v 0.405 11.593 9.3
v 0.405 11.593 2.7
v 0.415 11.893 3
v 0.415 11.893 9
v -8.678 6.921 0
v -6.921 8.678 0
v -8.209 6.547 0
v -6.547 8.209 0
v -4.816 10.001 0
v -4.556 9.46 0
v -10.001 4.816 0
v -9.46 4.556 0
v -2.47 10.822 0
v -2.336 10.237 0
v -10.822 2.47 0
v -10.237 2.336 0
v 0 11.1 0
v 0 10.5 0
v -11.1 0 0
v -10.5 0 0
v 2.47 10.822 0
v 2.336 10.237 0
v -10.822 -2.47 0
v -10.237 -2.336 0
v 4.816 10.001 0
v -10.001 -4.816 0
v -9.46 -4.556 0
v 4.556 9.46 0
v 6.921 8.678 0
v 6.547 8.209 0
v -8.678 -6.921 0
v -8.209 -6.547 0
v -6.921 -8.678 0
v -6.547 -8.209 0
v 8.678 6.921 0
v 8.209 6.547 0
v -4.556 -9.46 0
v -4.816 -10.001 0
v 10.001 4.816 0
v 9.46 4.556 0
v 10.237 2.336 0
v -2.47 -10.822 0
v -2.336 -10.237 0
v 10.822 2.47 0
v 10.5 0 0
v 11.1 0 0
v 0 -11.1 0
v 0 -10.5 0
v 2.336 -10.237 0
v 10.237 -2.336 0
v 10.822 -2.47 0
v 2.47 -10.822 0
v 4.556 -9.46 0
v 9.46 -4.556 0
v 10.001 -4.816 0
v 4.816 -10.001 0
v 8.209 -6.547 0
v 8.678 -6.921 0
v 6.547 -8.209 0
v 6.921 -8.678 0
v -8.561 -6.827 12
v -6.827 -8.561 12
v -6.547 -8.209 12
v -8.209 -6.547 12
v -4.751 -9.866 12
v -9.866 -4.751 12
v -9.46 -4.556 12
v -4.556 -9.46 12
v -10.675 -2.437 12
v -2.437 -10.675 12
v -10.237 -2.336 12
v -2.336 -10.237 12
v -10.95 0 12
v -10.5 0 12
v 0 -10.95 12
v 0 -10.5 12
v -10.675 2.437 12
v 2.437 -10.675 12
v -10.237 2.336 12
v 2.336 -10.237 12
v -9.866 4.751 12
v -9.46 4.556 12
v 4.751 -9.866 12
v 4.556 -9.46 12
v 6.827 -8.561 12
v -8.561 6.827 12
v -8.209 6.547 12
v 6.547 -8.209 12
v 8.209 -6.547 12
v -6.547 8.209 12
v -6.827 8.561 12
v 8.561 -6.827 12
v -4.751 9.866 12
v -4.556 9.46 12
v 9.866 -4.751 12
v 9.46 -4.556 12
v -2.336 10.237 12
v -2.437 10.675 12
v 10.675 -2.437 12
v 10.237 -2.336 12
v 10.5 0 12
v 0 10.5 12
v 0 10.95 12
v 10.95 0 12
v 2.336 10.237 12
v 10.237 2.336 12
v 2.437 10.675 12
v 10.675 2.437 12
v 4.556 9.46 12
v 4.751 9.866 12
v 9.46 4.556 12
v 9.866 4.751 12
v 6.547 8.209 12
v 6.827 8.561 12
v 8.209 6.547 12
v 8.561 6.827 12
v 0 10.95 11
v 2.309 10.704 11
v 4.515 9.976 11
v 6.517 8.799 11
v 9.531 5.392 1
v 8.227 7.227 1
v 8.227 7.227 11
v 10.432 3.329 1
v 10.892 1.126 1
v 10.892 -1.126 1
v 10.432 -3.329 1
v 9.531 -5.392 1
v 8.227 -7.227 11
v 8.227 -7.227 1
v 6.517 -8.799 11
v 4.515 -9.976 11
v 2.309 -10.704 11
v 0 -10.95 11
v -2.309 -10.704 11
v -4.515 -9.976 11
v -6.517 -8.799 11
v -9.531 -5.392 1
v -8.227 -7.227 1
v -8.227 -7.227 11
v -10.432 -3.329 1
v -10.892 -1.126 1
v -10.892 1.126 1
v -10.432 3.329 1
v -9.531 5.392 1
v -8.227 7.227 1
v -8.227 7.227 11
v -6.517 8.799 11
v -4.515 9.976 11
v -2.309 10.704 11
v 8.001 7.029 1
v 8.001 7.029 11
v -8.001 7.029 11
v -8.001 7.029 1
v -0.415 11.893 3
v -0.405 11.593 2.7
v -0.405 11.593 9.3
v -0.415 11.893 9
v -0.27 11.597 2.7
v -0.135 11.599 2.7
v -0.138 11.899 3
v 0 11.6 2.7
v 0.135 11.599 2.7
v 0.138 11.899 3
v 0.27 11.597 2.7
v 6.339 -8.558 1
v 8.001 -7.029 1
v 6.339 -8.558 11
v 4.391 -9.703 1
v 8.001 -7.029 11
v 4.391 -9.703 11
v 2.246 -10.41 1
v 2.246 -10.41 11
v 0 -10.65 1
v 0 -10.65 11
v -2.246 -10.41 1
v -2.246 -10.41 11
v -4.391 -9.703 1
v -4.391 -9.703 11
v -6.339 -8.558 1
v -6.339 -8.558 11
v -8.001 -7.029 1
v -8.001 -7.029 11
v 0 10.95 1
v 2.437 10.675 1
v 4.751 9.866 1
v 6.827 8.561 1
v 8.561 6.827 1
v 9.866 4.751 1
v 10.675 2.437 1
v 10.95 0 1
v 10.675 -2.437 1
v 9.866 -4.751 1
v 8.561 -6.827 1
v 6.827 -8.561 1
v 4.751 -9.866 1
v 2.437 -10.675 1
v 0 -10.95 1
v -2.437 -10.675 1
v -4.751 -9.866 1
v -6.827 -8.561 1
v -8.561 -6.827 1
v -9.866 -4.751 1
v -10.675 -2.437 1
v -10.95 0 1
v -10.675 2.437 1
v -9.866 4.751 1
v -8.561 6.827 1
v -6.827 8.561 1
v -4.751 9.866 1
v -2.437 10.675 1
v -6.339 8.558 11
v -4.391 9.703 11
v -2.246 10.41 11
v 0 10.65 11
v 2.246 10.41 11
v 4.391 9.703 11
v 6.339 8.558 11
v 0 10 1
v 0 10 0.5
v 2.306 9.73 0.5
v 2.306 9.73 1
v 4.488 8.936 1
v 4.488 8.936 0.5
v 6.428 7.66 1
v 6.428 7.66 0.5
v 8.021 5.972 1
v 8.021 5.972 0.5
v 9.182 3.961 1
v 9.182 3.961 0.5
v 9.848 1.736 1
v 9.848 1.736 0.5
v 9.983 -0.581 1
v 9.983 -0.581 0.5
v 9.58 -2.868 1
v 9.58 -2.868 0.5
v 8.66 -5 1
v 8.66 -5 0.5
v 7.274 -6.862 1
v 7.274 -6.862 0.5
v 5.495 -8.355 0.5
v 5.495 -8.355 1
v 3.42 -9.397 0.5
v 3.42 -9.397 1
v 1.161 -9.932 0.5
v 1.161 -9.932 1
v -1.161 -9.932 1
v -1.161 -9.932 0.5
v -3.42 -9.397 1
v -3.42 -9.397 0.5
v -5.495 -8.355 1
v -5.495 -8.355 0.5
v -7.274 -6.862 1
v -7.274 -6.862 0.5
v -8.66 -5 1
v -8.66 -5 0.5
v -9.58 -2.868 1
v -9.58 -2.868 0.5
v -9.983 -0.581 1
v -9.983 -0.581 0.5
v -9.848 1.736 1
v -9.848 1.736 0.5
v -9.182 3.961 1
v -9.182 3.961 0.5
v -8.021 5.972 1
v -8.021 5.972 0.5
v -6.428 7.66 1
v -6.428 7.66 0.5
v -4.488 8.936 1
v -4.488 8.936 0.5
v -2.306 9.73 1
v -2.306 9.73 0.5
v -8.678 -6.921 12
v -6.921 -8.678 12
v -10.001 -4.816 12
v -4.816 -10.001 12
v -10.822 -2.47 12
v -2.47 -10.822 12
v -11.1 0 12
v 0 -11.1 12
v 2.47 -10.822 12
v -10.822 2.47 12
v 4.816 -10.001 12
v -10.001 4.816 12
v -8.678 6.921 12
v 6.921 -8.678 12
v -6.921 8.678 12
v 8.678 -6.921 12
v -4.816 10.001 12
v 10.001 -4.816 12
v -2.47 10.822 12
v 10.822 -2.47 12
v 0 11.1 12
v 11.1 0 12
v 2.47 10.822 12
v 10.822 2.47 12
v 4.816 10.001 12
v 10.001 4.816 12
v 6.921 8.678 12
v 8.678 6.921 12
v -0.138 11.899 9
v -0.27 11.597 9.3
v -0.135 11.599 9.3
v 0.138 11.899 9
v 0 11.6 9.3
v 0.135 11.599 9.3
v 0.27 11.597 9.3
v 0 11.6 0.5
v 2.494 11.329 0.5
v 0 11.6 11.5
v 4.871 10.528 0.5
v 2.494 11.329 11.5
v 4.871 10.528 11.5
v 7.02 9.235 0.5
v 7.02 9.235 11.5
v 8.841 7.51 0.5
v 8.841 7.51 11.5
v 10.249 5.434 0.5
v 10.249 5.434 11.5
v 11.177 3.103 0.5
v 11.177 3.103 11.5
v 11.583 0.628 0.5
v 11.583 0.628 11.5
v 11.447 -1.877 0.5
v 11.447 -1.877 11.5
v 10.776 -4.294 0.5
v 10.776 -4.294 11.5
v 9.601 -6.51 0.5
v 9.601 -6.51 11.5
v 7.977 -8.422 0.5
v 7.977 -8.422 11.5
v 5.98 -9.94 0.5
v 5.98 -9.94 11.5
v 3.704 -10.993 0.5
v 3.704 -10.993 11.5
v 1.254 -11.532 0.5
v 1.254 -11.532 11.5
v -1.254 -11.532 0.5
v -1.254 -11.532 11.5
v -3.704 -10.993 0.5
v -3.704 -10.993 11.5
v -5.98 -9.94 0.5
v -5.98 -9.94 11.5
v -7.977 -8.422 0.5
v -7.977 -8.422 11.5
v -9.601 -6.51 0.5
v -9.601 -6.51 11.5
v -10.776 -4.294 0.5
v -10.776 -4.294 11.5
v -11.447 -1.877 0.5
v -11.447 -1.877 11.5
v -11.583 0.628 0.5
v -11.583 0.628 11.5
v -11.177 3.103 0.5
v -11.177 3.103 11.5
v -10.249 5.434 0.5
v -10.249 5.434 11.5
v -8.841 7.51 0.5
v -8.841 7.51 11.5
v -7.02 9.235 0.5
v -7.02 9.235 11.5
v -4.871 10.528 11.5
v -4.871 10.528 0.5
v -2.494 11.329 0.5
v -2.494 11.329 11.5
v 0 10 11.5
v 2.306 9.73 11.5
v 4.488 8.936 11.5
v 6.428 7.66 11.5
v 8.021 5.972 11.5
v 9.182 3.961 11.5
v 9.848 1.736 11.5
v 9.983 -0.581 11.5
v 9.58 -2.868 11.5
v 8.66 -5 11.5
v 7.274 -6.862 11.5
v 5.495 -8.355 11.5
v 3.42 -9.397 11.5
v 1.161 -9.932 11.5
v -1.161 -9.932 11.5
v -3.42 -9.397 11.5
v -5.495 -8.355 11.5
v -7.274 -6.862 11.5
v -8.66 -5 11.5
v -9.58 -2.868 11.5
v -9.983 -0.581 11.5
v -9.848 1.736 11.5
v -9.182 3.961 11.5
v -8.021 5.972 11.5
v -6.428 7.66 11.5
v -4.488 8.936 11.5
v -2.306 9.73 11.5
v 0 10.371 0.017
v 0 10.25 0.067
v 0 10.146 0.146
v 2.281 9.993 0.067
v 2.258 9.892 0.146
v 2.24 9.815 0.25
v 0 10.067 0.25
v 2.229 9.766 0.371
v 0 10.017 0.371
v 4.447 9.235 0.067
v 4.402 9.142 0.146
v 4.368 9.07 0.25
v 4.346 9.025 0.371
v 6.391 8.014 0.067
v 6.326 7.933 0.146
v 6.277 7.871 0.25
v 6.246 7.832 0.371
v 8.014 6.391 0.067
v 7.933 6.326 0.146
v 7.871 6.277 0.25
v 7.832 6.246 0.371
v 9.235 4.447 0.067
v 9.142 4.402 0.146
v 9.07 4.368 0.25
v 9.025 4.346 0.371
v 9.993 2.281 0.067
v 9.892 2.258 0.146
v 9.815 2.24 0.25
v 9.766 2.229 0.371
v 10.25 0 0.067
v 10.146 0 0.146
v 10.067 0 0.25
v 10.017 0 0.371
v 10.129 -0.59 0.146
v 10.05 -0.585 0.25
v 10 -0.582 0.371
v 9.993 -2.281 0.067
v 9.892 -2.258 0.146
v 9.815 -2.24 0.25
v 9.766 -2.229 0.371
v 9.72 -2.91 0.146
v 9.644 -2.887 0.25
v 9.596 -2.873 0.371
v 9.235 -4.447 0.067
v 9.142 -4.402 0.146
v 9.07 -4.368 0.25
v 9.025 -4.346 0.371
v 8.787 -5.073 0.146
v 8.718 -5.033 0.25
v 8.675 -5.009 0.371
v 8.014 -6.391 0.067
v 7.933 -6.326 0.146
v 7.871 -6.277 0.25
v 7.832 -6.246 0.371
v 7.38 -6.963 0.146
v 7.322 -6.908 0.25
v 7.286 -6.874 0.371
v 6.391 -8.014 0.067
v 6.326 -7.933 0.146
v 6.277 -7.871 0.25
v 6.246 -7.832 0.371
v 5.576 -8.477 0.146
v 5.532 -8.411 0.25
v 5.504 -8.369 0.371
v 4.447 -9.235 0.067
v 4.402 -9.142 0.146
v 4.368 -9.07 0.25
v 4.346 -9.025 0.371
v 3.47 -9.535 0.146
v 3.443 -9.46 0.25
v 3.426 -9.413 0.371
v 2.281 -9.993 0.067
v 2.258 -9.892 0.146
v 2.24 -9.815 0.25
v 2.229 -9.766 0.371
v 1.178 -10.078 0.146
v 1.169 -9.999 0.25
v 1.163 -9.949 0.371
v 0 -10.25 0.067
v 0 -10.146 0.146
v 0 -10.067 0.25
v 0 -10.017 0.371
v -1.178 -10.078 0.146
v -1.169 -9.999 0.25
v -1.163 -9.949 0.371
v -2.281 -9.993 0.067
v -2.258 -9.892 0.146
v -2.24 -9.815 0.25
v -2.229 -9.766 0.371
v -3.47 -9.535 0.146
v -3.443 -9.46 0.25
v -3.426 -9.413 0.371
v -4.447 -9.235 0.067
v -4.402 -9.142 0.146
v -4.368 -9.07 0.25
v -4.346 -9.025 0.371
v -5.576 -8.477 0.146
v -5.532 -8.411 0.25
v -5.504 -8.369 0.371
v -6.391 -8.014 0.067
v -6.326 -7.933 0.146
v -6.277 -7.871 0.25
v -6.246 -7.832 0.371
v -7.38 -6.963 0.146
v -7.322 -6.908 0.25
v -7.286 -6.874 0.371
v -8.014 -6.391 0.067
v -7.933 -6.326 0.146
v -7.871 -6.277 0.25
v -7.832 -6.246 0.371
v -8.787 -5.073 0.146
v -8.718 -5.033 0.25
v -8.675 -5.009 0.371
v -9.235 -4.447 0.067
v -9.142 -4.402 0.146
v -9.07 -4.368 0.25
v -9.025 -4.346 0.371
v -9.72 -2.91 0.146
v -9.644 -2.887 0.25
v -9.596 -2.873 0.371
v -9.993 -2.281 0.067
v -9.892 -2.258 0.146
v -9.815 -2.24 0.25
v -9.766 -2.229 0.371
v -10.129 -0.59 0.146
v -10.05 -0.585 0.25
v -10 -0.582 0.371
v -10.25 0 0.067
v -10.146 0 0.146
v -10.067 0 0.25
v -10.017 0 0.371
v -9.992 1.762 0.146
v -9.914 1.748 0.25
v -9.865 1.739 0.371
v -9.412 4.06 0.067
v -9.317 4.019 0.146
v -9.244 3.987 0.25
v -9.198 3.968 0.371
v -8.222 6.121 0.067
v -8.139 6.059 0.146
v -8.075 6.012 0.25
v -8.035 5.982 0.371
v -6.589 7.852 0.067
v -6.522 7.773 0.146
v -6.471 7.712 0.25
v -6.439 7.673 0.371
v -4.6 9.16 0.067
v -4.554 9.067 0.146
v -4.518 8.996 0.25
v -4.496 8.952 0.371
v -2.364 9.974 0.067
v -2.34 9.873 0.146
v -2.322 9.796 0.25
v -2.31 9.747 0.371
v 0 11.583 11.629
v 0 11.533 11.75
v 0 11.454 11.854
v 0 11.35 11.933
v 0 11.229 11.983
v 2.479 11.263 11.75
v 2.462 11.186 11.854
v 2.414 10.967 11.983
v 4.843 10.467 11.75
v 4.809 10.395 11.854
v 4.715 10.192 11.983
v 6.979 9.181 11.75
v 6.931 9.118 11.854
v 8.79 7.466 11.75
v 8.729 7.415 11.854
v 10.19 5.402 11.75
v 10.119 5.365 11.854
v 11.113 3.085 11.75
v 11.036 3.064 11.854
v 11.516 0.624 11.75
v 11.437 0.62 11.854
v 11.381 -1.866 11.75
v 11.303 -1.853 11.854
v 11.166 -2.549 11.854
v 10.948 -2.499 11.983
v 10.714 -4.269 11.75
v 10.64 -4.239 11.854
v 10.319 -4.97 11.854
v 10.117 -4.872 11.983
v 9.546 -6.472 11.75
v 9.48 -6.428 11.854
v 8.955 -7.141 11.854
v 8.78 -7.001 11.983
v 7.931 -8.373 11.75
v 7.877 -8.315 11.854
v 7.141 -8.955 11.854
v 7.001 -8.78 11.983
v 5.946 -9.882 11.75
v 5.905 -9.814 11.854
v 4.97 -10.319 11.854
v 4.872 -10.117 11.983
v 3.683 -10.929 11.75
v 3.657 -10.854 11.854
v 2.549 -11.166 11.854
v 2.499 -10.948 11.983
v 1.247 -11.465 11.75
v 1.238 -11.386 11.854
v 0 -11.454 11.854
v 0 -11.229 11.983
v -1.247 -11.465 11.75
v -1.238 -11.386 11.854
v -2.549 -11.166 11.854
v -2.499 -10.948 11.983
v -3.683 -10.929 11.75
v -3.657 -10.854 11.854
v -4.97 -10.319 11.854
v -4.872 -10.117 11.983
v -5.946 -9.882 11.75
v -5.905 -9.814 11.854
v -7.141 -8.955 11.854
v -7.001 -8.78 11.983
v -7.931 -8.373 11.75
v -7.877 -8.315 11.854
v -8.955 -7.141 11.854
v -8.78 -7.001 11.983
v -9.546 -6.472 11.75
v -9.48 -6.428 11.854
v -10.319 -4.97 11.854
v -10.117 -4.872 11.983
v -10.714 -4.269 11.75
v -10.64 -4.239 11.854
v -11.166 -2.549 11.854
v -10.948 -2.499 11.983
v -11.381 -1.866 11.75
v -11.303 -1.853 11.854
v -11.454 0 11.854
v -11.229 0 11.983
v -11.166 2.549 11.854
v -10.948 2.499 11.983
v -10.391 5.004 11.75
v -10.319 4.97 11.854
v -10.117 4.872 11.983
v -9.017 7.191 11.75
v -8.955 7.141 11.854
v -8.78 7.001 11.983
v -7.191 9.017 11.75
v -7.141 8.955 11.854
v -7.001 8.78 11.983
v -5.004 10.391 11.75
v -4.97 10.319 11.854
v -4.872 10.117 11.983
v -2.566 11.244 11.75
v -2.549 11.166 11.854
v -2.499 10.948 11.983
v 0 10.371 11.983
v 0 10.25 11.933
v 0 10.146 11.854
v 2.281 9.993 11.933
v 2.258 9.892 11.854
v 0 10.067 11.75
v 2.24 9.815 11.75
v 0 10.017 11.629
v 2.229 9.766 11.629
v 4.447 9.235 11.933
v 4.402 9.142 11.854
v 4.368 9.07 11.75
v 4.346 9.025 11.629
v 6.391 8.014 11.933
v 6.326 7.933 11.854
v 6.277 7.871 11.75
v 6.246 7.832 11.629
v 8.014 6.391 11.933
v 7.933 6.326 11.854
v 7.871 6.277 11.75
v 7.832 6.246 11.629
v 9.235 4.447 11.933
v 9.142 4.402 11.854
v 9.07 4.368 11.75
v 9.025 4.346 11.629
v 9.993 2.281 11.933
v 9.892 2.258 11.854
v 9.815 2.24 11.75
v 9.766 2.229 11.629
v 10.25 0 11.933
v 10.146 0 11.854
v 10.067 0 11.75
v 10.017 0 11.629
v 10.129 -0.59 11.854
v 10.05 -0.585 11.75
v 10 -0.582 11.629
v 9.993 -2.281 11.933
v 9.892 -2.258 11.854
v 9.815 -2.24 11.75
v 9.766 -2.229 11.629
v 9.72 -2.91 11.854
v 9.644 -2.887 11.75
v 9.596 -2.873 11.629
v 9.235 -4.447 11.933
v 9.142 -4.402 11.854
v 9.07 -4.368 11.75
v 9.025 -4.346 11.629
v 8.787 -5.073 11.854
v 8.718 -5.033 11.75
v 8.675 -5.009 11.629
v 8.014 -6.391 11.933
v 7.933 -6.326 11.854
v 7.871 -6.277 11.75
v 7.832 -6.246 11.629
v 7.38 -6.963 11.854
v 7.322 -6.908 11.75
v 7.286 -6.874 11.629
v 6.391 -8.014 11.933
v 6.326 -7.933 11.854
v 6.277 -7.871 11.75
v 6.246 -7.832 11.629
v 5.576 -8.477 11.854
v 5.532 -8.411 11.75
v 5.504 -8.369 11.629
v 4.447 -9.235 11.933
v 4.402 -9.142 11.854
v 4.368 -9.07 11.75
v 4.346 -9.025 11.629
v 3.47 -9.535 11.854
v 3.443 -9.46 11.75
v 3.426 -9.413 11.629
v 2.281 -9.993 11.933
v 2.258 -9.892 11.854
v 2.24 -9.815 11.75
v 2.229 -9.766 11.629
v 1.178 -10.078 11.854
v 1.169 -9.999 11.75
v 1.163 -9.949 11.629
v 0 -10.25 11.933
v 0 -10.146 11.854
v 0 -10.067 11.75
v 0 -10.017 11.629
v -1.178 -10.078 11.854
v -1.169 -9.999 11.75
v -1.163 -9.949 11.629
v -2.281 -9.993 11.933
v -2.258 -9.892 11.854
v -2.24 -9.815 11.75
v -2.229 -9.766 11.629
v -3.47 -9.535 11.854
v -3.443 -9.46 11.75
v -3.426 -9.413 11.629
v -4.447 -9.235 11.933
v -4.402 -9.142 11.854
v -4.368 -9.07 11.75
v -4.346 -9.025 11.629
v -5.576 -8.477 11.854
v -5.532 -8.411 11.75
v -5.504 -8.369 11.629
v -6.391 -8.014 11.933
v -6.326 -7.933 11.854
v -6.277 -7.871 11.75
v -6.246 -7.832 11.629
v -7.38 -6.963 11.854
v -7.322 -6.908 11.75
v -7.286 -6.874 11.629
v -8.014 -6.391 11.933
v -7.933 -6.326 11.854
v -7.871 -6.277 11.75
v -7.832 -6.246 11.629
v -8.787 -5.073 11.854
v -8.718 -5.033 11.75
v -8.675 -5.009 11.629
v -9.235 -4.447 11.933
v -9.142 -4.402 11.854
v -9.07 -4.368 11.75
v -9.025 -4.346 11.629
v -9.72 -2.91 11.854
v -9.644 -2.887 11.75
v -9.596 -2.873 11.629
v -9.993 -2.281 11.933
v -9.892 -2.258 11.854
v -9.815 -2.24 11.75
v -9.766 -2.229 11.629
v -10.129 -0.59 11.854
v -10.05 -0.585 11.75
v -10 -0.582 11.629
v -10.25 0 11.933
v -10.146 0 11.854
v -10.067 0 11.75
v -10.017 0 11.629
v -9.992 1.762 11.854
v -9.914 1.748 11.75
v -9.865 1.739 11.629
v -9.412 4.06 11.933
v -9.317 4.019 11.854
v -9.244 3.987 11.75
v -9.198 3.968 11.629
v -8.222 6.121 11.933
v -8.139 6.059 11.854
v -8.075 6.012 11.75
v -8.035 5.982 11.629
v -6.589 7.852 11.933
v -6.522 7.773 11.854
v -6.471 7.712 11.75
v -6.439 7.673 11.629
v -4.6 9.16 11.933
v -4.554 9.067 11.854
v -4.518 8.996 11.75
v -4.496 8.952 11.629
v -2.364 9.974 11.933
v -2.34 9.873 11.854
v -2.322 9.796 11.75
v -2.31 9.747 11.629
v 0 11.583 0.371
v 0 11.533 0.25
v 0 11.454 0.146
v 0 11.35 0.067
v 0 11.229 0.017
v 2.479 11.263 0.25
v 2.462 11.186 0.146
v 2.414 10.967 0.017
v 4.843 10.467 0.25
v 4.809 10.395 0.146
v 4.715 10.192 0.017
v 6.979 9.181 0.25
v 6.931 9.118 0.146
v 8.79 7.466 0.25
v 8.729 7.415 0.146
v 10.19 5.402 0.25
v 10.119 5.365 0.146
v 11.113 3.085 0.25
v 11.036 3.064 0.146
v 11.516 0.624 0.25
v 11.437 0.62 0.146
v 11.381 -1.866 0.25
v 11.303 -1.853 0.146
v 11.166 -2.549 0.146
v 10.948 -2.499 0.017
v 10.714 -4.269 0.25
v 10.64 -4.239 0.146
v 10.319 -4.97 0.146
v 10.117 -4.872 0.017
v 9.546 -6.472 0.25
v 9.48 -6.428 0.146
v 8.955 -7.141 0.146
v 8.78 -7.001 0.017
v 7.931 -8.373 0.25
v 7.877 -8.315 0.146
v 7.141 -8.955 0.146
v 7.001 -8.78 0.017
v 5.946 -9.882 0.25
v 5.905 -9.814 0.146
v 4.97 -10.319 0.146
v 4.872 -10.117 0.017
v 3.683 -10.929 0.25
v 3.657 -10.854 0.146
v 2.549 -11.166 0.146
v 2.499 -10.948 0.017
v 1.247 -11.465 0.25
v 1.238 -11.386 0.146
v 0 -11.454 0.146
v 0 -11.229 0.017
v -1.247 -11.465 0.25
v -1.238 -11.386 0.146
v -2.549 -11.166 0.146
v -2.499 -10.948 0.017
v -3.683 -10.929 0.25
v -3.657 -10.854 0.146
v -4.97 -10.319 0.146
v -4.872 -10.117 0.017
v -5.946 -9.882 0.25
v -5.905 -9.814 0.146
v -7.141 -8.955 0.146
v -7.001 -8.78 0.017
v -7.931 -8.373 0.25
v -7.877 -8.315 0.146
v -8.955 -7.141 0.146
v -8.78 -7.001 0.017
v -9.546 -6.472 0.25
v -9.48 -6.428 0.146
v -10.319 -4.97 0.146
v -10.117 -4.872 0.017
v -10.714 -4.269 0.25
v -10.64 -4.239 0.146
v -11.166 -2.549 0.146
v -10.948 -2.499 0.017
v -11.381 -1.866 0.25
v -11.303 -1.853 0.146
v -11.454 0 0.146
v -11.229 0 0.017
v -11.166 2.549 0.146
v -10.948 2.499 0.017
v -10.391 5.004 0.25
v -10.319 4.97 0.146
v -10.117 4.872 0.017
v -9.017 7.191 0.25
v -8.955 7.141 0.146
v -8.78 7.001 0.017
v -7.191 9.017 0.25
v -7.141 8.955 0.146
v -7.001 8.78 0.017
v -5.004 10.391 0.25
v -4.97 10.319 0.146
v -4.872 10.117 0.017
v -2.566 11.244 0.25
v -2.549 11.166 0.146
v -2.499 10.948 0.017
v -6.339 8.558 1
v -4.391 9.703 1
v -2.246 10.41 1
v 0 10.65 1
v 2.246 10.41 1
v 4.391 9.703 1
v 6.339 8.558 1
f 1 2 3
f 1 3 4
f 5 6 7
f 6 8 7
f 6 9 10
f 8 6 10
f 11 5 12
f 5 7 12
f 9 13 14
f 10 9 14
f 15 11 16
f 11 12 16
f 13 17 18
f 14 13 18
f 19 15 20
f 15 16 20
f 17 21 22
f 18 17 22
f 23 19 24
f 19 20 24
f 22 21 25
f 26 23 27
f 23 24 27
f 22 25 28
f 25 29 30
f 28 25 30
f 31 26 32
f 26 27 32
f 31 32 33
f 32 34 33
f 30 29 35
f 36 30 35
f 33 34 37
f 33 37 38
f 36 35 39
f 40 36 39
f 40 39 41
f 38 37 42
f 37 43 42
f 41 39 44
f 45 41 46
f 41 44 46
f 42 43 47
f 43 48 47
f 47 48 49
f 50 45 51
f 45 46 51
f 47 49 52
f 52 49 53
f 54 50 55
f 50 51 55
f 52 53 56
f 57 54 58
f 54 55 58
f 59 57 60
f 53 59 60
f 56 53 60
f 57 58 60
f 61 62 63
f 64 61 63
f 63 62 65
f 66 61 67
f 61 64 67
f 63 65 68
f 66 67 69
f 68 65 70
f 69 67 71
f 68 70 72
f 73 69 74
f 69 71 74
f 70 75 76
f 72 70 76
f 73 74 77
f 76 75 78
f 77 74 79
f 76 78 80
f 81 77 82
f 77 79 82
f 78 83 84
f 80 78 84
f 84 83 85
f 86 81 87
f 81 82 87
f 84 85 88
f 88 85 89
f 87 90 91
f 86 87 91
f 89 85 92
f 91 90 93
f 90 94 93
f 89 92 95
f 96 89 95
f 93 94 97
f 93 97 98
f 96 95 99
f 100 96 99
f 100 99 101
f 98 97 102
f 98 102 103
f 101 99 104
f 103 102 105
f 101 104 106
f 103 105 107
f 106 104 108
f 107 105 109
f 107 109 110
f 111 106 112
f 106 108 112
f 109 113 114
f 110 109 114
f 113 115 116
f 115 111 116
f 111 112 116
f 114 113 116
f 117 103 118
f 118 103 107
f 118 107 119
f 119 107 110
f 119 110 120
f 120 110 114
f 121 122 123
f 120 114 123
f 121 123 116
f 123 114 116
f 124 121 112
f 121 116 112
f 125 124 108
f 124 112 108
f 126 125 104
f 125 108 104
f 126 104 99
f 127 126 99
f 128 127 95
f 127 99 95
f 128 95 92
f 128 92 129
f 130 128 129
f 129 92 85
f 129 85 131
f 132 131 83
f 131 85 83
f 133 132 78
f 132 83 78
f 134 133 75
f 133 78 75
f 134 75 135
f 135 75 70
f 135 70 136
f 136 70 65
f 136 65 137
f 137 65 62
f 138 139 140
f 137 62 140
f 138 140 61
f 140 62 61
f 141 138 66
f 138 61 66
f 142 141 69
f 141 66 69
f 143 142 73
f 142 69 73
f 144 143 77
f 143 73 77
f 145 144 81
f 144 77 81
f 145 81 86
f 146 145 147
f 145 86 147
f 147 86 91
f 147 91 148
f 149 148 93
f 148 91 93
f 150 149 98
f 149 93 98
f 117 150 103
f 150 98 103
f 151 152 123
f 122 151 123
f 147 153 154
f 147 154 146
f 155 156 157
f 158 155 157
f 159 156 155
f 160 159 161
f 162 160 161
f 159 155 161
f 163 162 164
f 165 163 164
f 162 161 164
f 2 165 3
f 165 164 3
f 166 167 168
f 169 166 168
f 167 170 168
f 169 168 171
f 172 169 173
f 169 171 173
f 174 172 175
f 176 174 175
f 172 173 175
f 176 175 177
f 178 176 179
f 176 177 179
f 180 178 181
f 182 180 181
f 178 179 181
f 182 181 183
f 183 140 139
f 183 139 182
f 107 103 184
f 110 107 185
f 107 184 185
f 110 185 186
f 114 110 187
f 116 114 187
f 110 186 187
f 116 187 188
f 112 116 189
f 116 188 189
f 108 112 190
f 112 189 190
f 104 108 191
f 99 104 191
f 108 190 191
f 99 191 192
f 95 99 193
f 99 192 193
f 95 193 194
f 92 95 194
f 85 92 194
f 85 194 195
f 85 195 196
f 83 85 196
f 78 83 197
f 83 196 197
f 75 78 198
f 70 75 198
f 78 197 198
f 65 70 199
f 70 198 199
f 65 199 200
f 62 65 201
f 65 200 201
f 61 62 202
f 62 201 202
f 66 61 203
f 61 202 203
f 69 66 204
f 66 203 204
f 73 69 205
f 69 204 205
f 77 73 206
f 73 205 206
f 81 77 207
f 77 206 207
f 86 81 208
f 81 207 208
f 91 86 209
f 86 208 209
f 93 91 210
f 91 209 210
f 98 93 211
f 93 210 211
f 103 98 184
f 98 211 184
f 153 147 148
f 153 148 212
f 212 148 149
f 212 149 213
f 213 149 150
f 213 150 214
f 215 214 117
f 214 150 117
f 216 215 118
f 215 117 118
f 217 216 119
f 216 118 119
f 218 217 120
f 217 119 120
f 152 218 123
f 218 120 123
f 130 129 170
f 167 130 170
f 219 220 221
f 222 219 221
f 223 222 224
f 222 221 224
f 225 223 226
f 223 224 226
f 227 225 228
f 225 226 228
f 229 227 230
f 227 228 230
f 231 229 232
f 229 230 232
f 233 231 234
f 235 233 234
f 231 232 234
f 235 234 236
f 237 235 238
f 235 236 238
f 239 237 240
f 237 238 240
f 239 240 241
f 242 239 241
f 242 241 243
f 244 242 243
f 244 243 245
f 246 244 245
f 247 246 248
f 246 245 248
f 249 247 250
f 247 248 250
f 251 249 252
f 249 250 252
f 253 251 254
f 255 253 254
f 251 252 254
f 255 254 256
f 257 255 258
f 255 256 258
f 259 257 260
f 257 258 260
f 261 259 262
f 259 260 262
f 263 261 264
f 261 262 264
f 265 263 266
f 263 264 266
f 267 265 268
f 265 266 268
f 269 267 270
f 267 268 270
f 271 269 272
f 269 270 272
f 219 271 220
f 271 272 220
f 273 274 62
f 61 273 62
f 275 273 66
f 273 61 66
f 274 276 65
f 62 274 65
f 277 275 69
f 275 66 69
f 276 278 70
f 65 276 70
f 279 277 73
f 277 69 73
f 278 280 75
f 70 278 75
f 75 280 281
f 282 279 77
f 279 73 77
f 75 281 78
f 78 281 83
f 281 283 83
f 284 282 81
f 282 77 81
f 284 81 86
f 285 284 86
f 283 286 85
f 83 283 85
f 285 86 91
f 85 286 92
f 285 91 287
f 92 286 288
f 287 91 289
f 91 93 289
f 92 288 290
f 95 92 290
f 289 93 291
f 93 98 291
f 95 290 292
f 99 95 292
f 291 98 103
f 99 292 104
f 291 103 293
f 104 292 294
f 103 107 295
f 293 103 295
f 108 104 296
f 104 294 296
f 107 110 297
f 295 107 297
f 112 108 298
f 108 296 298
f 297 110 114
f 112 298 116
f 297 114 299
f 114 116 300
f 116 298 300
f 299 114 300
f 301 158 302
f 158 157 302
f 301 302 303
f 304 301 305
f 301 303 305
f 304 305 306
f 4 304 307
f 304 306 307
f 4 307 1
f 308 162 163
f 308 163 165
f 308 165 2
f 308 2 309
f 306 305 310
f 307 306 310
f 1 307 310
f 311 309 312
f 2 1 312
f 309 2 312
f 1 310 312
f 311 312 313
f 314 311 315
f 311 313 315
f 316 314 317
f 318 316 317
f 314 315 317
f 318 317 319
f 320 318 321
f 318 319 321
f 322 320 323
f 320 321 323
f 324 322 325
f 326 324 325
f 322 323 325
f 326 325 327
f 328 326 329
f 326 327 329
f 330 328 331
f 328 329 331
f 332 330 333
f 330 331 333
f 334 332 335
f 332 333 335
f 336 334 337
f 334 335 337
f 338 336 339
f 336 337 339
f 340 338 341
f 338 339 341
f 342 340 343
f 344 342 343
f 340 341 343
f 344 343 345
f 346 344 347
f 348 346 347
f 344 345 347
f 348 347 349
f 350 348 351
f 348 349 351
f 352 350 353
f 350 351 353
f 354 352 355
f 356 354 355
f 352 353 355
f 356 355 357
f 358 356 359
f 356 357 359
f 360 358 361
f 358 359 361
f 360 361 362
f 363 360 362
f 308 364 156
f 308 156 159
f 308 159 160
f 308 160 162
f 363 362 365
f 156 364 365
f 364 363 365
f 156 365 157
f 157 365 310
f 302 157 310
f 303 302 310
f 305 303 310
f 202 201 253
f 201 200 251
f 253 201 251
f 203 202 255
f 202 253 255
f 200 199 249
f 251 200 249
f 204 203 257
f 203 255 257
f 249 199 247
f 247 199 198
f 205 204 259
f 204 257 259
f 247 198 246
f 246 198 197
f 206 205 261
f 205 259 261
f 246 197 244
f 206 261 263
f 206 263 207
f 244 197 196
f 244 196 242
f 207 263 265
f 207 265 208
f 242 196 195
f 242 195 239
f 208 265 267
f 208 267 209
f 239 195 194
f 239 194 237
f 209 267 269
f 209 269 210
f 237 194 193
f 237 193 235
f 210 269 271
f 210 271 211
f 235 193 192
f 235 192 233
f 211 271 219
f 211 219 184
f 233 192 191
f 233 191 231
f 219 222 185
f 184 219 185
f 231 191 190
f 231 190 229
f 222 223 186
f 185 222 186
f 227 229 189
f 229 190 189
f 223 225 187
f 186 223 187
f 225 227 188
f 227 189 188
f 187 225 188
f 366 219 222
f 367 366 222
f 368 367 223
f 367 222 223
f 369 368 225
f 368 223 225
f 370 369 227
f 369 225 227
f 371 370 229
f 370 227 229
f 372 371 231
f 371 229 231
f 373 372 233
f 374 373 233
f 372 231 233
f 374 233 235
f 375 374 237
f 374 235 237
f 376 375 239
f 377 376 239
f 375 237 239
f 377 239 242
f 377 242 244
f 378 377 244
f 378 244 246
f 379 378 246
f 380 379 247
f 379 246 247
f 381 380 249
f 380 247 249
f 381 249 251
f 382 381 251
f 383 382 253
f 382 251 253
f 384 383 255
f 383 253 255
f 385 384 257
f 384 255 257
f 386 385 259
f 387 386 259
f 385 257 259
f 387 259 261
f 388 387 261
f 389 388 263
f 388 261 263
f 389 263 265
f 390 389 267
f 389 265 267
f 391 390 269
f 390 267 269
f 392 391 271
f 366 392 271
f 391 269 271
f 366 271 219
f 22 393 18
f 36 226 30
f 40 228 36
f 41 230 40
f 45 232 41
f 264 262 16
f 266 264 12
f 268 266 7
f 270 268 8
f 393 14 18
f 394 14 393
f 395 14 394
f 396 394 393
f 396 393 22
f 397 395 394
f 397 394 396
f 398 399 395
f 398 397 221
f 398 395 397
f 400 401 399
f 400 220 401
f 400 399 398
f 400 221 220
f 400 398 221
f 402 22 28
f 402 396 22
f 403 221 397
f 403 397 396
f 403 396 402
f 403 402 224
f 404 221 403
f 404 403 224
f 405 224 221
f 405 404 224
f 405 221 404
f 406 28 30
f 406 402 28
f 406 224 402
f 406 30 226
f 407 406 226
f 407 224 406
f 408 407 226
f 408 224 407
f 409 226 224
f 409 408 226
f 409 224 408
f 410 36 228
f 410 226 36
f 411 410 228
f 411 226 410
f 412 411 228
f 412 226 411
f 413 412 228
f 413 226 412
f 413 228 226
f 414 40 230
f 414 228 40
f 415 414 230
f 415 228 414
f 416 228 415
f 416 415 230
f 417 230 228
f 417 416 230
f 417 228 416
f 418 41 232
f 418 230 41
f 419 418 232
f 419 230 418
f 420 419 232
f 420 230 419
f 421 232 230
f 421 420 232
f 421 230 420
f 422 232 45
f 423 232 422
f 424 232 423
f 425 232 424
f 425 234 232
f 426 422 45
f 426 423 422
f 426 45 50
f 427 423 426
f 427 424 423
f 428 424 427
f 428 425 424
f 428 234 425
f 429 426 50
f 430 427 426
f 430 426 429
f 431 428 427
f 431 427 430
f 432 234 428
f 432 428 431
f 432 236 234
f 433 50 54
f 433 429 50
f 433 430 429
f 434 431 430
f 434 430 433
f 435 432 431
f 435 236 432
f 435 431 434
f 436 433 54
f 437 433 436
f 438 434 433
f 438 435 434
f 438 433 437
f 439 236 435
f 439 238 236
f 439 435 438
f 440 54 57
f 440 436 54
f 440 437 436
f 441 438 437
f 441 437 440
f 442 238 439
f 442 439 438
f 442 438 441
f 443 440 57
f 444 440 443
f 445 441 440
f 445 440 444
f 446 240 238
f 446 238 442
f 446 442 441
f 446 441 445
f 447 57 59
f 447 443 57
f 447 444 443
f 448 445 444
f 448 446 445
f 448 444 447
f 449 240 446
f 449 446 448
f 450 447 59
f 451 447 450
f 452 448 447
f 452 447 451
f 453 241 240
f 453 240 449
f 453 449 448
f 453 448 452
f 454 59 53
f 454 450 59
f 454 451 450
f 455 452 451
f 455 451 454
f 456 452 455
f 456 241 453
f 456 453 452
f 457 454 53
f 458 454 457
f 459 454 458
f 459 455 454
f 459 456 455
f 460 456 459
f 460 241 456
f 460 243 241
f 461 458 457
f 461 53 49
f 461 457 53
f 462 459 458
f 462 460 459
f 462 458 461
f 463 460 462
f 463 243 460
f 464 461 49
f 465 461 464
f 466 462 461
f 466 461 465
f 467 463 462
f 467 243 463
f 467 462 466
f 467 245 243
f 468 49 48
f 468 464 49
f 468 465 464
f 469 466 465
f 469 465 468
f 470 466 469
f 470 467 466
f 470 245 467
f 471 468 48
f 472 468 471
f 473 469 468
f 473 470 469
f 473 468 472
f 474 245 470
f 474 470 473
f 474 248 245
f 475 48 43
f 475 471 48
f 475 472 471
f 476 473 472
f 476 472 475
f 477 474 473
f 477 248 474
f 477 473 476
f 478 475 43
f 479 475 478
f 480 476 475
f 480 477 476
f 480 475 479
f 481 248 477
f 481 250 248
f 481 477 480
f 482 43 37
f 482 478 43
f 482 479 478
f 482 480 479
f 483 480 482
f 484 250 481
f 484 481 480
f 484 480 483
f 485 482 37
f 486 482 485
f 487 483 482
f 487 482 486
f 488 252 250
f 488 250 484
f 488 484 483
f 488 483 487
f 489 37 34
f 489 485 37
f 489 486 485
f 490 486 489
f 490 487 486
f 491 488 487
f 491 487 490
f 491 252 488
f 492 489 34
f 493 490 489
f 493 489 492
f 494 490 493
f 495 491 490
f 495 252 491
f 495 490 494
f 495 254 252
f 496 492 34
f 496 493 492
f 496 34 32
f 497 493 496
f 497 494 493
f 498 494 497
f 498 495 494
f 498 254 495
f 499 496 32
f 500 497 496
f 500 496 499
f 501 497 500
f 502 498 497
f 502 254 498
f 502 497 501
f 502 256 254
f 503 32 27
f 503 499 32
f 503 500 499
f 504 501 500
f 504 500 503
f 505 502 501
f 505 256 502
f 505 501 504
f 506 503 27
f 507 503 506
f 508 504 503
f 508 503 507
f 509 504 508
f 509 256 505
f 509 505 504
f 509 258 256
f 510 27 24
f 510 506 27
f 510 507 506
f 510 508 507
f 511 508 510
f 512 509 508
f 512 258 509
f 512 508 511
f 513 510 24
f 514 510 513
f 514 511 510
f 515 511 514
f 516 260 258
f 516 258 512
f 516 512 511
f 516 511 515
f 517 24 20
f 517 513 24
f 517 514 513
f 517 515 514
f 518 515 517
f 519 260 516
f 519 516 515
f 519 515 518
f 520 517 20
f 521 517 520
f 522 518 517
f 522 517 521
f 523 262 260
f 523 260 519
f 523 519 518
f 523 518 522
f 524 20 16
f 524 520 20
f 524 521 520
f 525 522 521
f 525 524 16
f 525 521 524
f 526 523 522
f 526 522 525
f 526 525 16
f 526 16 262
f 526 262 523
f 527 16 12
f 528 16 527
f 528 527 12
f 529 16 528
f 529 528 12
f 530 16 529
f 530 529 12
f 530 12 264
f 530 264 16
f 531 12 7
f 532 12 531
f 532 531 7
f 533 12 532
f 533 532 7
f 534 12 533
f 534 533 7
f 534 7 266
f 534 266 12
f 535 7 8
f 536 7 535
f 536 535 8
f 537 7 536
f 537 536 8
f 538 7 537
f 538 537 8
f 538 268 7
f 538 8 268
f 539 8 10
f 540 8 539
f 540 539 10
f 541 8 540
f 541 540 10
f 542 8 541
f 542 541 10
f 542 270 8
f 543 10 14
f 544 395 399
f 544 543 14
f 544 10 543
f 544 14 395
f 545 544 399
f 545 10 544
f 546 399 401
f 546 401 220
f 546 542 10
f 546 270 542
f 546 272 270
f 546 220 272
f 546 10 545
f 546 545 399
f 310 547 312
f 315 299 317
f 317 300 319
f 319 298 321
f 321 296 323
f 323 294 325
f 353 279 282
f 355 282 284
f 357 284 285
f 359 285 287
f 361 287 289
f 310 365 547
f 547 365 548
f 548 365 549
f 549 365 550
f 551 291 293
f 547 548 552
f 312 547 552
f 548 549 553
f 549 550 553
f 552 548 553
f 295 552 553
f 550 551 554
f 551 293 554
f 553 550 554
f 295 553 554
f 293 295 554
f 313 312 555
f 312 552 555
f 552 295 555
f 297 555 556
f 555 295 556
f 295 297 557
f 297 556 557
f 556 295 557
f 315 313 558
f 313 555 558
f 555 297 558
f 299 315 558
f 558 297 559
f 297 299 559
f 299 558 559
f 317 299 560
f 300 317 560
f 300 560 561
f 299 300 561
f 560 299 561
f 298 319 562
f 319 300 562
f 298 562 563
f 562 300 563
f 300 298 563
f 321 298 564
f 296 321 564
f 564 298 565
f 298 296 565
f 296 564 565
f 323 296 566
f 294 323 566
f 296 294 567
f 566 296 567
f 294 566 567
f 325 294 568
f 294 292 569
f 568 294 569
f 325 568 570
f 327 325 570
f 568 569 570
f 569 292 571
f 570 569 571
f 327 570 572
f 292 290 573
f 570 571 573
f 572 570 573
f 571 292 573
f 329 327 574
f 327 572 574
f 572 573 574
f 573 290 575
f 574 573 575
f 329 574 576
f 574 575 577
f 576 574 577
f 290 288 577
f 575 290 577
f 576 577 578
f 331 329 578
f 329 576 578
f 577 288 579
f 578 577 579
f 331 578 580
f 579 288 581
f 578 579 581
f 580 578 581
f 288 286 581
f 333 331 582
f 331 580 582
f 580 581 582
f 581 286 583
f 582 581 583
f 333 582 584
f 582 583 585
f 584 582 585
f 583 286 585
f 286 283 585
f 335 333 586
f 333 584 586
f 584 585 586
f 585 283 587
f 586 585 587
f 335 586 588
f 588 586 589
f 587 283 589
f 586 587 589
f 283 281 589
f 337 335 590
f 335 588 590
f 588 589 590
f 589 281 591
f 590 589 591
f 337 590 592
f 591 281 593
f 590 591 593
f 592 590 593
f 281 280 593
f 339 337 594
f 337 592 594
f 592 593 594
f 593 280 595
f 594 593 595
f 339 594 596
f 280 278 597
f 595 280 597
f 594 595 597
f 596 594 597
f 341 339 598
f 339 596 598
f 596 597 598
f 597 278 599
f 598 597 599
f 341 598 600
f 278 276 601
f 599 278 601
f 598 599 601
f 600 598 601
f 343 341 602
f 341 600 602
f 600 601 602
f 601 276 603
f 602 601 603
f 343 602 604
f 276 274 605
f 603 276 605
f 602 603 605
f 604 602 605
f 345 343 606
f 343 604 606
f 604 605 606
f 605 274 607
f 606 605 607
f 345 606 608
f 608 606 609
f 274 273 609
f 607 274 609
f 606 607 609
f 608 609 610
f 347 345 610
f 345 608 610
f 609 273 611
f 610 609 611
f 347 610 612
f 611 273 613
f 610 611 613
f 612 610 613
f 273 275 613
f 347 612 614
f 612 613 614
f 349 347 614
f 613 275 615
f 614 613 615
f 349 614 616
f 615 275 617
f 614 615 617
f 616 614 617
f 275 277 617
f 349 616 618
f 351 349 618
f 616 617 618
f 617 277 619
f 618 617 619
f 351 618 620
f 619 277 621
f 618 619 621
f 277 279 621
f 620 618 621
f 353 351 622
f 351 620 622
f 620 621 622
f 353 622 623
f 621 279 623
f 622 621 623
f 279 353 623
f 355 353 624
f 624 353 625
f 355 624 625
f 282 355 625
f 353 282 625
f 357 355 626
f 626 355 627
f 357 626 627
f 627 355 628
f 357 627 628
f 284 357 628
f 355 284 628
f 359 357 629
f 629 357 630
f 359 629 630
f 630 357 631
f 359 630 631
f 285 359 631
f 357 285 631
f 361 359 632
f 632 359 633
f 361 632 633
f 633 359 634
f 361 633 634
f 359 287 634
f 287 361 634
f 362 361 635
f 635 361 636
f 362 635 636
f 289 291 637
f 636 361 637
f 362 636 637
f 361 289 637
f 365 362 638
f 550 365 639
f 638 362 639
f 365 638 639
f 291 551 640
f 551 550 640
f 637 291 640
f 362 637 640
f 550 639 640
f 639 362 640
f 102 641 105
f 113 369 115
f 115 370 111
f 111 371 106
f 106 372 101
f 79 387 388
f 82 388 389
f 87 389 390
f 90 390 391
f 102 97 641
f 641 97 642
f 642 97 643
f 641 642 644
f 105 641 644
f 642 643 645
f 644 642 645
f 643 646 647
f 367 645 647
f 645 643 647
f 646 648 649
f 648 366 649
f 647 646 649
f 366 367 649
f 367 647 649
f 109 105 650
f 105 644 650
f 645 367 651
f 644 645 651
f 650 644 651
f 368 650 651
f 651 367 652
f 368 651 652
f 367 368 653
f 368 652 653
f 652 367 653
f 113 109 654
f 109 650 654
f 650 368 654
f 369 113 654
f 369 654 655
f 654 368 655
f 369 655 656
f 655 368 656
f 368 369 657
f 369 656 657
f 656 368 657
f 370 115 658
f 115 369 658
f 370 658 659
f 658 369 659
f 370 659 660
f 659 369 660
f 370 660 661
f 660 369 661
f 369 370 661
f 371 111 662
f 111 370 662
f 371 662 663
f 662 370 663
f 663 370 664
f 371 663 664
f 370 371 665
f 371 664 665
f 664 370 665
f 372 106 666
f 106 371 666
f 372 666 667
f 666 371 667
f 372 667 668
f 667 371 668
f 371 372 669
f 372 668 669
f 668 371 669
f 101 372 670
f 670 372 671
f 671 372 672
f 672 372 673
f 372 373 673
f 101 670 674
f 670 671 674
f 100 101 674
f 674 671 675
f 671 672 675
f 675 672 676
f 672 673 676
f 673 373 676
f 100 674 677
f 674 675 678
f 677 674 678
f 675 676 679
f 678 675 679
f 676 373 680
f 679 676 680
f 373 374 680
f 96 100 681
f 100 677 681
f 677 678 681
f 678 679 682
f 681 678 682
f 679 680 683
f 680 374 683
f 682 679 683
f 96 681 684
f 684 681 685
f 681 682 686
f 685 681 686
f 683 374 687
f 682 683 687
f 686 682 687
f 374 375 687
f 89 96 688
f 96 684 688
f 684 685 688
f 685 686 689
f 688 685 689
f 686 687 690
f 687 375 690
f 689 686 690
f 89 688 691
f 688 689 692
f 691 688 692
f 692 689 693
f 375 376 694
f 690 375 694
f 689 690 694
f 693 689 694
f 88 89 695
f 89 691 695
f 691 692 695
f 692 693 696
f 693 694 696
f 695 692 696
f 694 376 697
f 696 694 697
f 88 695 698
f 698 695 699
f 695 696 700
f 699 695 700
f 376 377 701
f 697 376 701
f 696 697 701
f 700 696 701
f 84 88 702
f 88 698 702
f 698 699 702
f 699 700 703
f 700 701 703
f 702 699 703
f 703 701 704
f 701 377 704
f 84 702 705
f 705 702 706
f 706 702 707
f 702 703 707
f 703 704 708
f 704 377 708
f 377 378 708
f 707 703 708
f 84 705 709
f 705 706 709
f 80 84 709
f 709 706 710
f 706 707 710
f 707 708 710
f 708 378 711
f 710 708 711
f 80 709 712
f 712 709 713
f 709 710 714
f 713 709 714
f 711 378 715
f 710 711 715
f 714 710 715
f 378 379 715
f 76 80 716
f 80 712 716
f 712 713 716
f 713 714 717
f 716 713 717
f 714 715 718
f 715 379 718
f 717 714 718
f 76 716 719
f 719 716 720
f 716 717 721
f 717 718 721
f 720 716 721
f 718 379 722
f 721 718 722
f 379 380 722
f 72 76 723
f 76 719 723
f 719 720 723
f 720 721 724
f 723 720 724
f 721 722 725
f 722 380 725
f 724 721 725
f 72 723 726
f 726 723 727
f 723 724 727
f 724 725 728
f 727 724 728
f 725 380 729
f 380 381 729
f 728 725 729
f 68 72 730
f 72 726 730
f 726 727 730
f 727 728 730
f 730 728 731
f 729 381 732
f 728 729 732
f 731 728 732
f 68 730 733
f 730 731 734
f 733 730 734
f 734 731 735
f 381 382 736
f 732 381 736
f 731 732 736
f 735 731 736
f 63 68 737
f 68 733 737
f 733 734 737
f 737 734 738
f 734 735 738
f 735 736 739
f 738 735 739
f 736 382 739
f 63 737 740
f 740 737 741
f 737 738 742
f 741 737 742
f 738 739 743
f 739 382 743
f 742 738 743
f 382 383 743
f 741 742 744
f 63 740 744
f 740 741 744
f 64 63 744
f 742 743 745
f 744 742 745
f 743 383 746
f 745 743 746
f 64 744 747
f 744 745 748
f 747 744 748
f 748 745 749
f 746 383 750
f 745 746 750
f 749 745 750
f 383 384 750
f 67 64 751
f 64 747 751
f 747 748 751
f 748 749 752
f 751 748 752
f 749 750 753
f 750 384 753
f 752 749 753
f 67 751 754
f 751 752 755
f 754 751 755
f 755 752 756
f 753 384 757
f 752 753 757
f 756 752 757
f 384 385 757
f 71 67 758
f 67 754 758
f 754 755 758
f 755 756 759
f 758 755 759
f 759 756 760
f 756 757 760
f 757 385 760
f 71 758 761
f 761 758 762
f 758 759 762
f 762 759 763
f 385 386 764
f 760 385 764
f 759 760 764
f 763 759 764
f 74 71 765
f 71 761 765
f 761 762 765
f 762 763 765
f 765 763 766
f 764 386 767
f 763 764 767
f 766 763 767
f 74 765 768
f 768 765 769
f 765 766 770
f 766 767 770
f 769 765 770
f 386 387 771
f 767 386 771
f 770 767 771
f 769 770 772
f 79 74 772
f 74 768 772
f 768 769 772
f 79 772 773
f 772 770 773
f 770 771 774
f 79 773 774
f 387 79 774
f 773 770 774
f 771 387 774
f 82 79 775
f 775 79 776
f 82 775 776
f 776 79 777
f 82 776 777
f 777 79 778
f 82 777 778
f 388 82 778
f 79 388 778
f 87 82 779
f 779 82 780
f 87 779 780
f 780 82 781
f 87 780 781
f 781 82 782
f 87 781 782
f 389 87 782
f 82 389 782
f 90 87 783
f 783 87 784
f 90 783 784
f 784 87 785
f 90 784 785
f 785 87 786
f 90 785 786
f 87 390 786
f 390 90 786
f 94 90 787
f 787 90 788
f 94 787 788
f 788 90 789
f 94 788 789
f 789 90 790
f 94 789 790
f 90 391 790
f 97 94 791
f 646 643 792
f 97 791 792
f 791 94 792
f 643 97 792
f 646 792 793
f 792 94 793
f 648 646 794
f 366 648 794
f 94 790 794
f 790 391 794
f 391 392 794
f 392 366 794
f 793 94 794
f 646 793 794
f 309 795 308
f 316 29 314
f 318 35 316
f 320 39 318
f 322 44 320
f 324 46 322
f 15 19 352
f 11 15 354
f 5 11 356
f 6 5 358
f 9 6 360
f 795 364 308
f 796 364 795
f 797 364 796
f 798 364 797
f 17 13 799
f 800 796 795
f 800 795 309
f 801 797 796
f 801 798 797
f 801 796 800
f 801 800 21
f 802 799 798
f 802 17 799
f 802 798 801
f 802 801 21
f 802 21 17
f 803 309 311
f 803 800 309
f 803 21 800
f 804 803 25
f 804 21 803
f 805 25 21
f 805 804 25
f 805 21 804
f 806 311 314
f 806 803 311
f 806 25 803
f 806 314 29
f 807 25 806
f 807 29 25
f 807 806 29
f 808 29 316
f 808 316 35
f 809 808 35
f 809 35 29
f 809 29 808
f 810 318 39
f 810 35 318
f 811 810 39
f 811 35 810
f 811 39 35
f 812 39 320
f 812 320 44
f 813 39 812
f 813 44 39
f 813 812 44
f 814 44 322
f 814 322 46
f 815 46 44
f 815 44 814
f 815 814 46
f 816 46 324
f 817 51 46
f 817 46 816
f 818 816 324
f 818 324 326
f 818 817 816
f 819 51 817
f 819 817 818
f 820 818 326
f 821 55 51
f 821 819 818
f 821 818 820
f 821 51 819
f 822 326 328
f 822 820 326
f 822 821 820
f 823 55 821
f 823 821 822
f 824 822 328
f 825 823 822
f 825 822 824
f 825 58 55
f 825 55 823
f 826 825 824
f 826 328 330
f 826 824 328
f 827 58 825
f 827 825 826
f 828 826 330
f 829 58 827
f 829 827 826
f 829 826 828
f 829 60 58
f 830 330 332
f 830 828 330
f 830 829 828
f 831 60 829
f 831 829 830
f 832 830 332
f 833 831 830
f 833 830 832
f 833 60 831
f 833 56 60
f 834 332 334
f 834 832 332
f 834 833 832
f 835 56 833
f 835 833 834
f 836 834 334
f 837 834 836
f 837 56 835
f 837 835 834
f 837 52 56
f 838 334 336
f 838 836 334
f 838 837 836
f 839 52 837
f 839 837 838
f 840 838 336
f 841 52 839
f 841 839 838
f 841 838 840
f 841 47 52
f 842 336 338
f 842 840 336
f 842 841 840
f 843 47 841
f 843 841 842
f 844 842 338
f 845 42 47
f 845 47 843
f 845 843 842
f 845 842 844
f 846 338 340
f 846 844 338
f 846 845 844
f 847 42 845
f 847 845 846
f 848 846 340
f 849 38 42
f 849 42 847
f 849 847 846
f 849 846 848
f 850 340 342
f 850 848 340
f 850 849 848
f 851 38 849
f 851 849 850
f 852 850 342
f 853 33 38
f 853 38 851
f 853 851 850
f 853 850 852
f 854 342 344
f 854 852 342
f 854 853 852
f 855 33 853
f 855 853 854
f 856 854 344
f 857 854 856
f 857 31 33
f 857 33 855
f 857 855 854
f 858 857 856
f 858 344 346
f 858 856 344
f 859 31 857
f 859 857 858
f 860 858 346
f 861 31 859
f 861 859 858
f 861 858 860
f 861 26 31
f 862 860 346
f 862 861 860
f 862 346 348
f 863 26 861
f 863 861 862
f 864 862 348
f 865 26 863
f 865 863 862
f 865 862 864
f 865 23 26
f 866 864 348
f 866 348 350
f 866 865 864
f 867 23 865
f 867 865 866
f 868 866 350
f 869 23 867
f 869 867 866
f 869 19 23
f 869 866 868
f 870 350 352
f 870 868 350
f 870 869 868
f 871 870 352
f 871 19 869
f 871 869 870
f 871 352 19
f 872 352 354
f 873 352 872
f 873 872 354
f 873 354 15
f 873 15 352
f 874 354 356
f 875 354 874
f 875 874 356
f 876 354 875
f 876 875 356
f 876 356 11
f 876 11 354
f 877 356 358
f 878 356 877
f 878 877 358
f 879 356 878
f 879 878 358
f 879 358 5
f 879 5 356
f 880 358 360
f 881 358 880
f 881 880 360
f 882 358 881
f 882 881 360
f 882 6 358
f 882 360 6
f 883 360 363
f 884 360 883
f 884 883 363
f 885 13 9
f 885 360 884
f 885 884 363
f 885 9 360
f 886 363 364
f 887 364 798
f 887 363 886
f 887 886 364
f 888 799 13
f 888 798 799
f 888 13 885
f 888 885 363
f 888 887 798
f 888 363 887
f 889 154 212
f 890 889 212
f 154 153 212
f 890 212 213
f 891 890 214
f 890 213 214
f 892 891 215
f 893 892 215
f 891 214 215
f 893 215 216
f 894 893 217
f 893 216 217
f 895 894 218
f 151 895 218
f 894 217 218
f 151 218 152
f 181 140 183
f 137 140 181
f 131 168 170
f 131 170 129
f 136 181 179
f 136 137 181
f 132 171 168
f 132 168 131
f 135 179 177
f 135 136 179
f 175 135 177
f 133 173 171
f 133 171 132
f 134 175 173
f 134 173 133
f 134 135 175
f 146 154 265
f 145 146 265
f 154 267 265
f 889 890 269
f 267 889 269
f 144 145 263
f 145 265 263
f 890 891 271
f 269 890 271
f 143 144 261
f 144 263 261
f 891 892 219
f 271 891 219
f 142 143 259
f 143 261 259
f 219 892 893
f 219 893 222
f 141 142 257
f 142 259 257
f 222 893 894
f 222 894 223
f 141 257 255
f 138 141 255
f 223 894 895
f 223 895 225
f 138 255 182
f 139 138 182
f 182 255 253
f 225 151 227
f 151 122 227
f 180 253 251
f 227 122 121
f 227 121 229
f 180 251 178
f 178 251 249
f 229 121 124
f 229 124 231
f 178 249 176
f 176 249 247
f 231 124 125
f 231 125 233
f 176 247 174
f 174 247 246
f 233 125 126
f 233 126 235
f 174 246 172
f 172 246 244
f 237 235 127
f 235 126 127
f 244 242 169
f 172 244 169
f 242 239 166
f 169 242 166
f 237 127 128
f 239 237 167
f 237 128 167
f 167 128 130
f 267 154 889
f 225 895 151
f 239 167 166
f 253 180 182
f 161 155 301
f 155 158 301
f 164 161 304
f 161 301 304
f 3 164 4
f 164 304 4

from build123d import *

# Parameters (mm, degrees)
F2_W          = 0.3
F2_H          = 10
F5_ANGLE_BACK = 48.7028489575
F5_ANGLE      = 97.405697915
F6_ANGLE_BACK = 2
F6_ANGLE      = 4
F7_R          = 0.5
F7_2_R        = 0.5


with BuildPart() as f3:
    # F2 (on Right) → F3 (revolve)
    with BuildSketch(Plane.YZ):
        Polygon((10.95, 12), (10.95, 11), (10.95, 1), (10.65, 1), (10, 1), (10, 0), (11.6, 0), (11.6, 2.7), (11.6, 9.3), (11.6, 12), align=None)
    revolve(axis=Axis((0, 0, 13.9442766085), (0, 0, -1)))

    # F2 (on Right) → F6 (revolve)
    with BuildSketch(Plane.YZ, mode=Mode.PRIVATE) as f6_sk:
        Polygon((11.9, 9), (11.6, 9.3), (11.6, 2.7), (11.9, 3), align=None)
    revolve(f6_sk.sketch.rotate(Axis((0, 0, 13.9442766085), (0, 0, -1)), -F6_ANGLE_BACK), axis=Axis((0, 0, 13.9442766085), (0, 0, -1)), revolution_arc=F6_ANGLE)

    # F7
    f7_edges = [f3.edges().sort_by_distance(p)[0] for p in [
        (0, -11.6, 12),
        (0, -10, 0),
        (0, -11.6, 0),
    ]]
    fillet(f7_edges, radius=F7_R)


with BuildPart() as f4:
    # F2 (on Right) → F4 (revolve)
    with BuildSketch(Plane.YZ):
        Polygon((10.65, 1), (10.65, 11), (10.95, 11), (10.95, 12), (10, 12), (10, 1), align=None)
        with Locations((10.8, 6)):
            Rectangle(F2_W, F2_H)
    revolve(axis=Axis((0, 0, 13.9442766085), (0, 0, -1)))

    # F2 (on Right) → F5 (revolve, cut)
    with BuildSketch(Plane.YZ, mode=Mode.PRIVATE) as f5_sk:
        with Locations((10.8, 6)):
            Rectangle(F2_W, F2_H)
        with Locations((-10.8, 6)):
            Rectangle(F2_W, F2_H)
    revolve(f5_sk.sketch.rotate(Axis((0, 0, 13.9442766085), (0, 0, -1)), -F5_ANGLE_BACK), axis=Axis((0, 0, 13.9442766085), (0, 0, -1)), revolution_arc=F5_ANGLE, mode=Mode.SUBTRACT)

    # F7#2
    f7_2_edges = [f4.edges().sort_by_distance(p)[0] for p in [
        (0, -10, 12),
    ]]
    fillet(f7_2_edges, radius=F7_2_R)


solid = Compound([f3.part, f4.part])
